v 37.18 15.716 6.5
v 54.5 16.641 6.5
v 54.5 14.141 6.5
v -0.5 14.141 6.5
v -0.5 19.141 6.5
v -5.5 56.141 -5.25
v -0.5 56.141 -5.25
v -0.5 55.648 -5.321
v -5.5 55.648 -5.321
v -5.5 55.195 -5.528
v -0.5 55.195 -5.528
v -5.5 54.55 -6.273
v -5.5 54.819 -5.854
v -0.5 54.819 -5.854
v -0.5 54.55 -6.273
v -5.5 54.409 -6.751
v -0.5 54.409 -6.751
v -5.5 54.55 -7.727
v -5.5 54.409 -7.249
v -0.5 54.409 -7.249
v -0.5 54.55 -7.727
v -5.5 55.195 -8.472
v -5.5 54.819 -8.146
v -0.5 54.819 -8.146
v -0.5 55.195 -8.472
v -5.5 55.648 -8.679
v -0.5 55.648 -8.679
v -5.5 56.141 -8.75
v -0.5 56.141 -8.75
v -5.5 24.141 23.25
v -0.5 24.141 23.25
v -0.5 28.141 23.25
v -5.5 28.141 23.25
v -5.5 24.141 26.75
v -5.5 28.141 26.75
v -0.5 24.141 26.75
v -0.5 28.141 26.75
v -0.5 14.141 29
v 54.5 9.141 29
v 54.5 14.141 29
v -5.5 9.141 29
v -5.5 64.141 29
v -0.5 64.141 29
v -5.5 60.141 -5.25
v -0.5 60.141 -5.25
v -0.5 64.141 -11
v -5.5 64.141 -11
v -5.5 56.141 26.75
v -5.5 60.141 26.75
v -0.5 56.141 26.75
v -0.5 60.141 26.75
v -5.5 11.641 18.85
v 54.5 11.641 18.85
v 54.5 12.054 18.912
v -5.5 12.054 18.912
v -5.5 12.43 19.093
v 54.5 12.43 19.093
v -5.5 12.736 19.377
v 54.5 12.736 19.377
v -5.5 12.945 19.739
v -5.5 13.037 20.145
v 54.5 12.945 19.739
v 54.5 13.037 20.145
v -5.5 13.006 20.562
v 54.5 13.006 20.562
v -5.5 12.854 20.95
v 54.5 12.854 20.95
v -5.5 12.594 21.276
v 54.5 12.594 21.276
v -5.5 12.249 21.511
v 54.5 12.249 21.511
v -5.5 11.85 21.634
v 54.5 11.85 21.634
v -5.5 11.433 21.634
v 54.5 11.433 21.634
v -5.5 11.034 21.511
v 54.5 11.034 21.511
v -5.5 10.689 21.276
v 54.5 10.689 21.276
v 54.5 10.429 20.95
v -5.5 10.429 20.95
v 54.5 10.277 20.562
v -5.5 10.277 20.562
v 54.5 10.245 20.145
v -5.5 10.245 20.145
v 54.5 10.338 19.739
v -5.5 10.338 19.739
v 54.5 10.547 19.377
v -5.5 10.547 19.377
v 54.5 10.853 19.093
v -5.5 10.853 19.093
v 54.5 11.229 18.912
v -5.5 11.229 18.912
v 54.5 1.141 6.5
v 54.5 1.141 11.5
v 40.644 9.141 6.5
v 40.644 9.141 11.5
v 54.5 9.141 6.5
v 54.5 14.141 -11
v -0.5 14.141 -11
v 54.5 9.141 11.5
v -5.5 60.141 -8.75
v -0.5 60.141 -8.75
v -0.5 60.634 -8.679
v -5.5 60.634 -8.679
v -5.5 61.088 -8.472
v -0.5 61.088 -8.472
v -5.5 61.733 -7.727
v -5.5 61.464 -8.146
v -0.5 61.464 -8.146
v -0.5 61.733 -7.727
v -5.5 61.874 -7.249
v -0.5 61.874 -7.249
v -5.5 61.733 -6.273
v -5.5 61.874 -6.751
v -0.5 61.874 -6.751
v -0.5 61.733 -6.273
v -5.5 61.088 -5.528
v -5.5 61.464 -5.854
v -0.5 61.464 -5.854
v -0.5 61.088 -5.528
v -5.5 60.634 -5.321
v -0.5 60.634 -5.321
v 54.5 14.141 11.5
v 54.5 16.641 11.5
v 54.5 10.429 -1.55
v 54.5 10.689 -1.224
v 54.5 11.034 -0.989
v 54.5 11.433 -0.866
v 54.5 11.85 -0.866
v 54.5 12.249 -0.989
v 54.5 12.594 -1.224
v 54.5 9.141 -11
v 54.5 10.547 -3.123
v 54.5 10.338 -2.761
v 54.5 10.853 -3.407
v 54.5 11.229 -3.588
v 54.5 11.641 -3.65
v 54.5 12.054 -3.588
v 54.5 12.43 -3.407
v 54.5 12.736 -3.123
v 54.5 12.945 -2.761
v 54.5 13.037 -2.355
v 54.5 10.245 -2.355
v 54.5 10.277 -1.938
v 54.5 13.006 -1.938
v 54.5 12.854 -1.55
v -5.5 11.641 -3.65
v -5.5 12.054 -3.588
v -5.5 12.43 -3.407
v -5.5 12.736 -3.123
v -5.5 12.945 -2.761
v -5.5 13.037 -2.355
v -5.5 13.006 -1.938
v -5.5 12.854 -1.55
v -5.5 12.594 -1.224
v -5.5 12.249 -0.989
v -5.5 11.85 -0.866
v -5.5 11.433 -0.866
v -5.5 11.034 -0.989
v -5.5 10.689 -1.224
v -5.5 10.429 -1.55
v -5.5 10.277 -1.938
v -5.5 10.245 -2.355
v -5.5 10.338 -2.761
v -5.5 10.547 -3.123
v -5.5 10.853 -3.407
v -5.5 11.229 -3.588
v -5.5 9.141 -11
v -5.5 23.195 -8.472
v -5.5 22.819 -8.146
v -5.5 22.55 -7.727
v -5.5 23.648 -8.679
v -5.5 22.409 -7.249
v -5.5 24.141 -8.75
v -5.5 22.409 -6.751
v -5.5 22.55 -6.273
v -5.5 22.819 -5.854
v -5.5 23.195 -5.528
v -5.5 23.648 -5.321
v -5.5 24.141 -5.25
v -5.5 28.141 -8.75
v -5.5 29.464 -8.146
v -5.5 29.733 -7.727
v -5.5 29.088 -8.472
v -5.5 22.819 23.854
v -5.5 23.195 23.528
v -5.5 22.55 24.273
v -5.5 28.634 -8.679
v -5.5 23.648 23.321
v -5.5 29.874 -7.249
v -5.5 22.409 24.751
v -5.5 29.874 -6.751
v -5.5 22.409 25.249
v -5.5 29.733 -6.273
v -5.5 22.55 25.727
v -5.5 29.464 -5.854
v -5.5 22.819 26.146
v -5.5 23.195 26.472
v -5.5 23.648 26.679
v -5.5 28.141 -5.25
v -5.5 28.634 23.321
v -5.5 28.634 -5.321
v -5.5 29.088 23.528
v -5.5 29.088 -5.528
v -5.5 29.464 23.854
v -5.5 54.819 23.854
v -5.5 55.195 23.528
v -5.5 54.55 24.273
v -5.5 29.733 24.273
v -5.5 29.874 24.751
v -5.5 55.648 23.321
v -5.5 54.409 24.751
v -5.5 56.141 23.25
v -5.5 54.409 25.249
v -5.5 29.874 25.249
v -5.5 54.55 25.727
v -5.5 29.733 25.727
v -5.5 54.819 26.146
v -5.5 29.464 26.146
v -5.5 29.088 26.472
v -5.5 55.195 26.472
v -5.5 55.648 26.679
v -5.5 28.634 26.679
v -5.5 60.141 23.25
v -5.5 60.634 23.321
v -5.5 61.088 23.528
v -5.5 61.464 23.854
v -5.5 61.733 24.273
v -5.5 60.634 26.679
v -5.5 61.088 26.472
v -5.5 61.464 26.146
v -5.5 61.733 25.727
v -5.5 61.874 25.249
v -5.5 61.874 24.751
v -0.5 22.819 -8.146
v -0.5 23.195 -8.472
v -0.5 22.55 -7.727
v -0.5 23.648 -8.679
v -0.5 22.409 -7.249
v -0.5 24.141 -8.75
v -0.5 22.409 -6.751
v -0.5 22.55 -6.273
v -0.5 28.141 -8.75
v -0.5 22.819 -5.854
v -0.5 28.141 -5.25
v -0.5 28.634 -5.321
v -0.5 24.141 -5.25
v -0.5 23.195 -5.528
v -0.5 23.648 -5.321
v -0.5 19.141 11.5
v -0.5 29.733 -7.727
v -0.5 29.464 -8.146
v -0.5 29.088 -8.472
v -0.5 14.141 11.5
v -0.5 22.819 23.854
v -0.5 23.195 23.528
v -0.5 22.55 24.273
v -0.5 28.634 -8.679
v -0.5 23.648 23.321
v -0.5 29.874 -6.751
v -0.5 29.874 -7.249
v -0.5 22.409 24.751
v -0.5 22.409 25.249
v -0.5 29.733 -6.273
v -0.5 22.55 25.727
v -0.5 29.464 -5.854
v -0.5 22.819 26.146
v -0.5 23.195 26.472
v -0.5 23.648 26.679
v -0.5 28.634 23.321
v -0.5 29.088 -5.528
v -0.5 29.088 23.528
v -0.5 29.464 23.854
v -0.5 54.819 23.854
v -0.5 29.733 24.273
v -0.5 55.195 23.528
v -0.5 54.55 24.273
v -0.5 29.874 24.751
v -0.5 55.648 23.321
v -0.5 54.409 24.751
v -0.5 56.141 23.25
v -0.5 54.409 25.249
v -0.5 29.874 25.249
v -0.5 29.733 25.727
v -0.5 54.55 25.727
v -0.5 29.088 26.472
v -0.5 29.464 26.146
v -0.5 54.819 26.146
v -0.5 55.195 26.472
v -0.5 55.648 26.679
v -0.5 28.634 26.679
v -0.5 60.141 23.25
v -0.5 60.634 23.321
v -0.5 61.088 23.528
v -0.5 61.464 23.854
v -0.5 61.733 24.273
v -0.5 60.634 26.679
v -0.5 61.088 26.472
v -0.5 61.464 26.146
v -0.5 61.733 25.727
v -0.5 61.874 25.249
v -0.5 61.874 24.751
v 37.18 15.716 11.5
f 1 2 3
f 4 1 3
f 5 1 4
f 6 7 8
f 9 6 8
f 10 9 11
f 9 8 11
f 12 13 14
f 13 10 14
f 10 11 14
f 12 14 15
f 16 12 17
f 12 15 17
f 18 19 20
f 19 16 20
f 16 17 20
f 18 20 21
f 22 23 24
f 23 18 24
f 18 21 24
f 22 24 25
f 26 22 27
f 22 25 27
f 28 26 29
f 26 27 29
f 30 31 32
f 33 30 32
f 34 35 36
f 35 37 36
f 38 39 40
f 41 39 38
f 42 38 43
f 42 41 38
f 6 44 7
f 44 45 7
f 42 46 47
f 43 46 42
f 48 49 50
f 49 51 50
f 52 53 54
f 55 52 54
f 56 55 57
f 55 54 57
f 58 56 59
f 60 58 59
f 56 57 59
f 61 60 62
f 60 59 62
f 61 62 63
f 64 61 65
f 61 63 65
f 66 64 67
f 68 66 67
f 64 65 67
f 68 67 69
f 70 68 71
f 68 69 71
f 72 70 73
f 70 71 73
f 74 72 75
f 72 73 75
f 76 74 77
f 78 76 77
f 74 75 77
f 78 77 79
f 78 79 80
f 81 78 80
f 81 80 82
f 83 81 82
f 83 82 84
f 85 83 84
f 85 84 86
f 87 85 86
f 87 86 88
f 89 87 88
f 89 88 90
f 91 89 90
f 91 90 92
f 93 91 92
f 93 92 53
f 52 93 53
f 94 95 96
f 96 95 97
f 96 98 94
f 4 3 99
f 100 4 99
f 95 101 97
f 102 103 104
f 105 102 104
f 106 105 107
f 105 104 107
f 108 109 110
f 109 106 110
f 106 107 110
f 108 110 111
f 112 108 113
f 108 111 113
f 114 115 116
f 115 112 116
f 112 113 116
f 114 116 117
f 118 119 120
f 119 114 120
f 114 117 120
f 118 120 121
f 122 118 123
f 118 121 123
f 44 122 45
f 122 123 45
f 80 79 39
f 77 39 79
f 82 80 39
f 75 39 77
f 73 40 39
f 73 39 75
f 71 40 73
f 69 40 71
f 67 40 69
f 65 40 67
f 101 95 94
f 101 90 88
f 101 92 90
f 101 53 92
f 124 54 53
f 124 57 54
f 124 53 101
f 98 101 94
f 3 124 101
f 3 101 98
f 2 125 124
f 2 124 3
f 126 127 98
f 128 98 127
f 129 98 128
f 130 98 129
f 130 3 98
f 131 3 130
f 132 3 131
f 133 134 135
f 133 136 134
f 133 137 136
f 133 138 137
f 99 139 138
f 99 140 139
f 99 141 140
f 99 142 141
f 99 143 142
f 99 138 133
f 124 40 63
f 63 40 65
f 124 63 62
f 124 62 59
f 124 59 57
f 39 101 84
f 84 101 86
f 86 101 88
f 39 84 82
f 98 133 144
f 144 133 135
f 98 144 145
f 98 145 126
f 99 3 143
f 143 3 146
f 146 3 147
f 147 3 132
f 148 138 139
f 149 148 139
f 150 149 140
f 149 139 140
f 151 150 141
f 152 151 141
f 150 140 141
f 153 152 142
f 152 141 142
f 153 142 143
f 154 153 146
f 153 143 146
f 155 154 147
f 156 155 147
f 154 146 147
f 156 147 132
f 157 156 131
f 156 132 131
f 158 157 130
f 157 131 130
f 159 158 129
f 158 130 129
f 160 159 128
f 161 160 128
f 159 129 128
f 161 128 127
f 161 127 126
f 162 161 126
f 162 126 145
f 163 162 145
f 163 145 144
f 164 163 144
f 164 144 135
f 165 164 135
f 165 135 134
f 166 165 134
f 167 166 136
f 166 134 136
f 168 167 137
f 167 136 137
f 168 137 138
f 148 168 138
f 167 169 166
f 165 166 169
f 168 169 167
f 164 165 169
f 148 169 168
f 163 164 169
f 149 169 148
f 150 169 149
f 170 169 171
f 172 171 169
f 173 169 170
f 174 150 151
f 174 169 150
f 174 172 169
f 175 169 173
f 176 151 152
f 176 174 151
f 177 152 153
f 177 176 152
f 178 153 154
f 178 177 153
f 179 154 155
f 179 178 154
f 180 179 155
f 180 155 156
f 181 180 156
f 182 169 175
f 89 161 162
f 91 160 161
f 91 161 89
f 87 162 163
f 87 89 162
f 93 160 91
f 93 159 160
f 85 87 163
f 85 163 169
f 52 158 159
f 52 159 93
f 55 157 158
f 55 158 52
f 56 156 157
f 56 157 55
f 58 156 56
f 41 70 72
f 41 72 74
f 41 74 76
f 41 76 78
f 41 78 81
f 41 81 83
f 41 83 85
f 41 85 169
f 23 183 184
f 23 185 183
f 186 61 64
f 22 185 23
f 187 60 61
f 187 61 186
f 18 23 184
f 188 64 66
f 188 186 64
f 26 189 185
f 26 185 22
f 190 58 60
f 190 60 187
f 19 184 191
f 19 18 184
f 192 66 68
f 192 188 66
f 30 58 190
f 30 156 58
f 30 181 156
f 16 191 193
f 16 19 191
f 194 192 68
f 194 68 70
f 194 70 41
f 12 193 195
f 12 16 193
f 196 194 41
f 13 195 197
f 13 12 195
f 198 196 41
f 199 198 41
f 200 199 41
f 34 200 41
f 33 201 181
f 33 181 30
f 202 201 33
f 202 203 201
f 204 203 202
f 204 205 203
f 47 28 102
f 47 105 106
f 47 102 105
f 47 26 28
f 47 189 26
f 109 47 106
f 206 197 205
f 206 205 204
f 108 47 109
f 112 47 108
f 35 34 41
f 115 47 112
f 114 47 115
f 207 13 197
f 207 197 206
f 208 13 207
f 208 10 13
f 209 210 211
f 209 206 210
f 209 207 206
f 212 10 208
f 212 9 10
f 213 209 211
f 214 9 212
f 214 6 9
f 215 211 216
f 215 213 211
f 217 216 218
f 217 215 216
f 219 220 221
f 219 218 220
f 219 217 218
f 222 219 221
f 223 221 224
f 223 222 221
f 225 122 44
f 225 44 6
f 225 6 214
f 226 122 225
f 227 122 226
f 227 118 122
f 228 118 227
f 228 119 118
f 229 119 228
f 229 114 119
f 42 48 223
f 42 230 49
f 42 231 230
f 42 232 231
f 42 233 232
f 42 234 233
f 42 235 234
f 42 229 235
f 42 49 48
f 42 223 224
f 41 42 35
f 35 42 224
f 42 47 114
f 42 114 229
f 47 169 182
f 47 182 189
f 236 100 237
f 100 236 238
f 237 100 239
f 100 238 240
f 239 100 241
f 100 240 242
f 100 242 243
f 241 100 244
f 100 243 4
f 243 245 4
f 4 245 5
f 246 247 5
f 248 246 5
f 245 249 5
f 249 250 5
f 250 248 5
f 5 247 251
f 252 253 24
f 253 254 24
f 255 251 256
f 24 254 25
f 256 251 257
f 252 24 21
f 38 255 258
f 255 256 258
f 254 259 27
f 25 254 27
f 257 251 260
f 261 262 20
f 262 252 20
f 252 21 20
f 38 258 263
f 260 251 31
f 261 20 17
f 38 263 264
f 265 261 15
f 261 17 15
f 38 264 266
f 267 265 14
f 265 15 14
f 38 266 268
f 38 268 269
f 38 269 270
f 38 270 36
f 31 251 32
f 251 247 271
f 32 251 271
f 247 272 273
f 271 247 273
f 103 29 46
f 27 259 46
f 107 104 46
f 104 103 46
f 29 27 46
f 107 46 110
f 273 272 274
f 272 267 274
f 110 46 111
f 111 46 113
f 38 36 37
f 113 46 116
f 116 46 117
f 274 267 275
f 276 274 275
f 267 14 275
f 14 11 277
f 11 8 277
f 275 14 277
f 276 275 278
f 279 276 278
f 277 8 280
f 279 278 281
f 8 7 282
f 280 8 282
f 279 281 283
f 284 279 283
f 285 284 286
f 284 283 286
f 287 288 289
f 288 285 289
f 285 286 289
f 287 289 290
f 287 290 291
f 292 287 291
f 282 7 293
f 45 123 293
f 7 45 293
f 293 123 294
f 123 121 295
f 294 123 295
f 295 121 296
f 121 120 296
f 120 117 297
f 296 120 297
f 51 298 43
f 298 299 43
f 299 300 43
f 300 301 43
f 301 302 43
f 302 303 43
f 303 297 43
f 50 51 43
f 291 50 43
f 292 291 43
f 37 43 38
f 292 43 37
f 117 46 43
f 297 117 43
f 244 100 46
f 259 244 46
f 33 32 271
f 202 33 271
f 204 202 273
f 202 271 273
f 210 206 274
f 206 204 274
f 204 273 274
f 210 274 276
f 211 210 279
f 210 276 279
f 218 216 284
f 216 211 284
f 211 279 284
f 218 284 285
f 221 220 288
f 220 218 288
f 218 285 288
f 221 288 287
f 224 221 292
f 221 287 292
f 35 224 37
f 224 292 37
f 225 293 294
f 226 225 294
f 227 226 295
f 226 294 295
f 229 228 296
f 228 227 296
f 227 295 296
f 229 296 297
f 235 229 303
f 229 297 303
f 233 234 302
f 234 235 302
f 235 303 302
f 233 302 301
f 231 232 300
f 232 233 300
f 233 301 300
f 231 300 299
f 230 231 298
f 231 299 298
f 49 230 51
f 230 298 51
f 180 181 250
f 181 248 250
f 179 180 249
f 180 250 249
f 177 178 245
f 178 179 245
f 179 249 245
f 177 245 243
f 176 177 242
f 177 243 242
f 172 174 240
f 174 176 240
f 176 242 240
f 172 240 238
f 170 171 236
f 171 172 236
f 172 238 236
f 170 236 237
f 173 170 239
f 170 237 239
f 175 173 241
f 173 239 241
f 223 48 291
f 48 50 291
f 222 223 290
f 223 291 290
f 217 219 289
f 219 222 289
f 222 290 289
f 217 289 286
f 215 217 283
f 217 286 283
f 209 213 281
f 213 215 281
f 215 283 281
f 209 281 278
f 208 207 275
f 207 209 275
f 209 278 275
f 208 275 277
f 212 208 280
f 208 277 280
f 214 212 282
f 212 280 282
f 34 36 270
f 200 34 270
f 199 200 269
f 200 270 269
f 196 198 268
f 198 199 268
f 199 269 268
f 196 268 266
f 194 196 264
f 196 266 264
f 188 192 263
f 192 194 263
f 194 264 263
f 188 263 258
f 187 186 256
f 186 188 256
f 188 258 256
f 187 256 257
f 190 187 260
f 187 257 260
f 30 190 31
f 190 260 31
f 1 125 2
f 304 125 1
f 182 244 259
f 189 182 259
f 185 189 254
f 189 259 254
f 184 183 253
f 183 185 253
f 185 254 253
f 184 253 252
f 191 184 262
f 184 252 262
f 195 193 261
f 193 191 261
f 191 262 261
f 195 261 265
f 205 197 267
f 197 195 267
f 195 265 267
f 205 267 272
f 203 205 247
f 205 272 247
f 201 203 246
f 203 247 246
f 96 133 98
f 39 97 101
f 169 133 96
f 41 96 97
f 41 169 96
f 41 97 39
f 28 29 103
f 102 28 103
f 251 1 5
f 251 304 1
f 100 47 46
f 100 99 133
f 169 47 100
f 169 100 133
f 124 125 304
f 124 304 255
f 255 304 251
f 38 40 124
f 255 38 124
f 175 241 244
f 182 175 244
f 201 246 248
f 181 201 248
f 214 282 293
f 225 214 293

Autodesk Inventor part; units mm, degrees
ref_plane "YZ Plane" through (0, 0, 0) normal (1, 0, 0) x (0, 1, 0)
ref_plane "XZ Plane" through (0, 0, 0) normal (0, 1, 0) x (-1, 0, 0)
ref_plane "XY Plane" through (0, 0, 0) normal (0, 0, 1) x (1, 0, 0)
ref_plane "Arbeitsebene1" through (-0.5, 64.1414, -11) normal (-1, 0, 0) x (0, 0, 1)
sketch "Skizze1" plane through (-0.5, 64.1414, -11) normal (-1, 0, 0) x (0, 0, 1)
  line L0 (40, -27) -> (40, -40) projected
  line L1 (40, -27) -> (29, -27) projected
  line L2 (29, -40) -> (29, -27) projected
  line L3 (29, -40) -> (40, -40) projected
  circle A0 centre (32, -32) radius 1.5 projected
  circle A1 centre (36, -36) radius 1.75 projected
  line L4 (0, -40) -> (11, -40) projected
  line L5 (11, -40) -> (11, -27) projected
  line L6 (0, -27) -> (11, -27) projected
  line L7 (0, -27) -> (0, -40) projected
  circle A2 centre (8, -32) radius 1.5 projected
  circle A3 centre (4, -36) radius 1.75 projected
  line L8 (0, 0) -> (0, -13) projected
  line L9 (0, -13) -> (11, -13) projected
  line L10 (11, 0) -> (11, -13) projected
  line L11 (0, 0) -> (11, 0) projected
  circle A4 centre (8, -8) radius 1.5 projected
  circle A5 centre (4, -4) radius 1.75 projected
  line L12 (29, 0) -> (40, 0) projected
  line L13 (29, 0) -> (29, -13) projected
  line L14 (40, -13) -> (29, -13) projected
  line L15 (40, 0) -> (40, -13) projected
  circle A6 centre (32, -8) radius 1.5 projected
  circle A7 centre (36, -4) radius 1.75 projected
  line L16 (40, -40) -> (0, -40)
  line L17 (0, -40) -> (0, 0)
  line L18 (0, 0) -> (40, 0)
  line L19 (40, 0) -> (40, -40)
  line L20 (40, -40) -> (0, -40)
  line L21 (0, -40) -> (0, -55)
  line L22 (0, -55) -> (40, -55)
  line L23 (40, -55) -> (40, -40)
  line L24 (36, -36) -> (36, -40) construction
  line L25 (37.75, -36) -> (37.75, -40)
  line L26 (34.25, -40) -> (34.25, -36)
  arc A8 (37.75, -36) -> (34.25, -36) centre (36, -36) ccw
  arc A9 (34.25, -40) -> (37.75, -40) centre (36, -40) ccw
  line L27 (4, -36) -> (4, -40) construction
  line L28 (5.75, -36) -> (5.75, -40)
  line L29 (2.25, -40) -> (2.25, -36)
  arc A10 (5.75, -36) -> (2.25, -36) centre (4, -36) ccw
  arc A11 (2.25, -40) -> (5.75, -40) centre (4, -40) ccw
  line L30 (4, -4) -> (4, -8) construction
  line L31 (5.75, -4) -> (5.75, -8)
  line L32 (2.25, -8) -> (2.25, -4)
  arc A12 (5.75, -4) -> (2.25, -4) centre (4, -4) ccw
  arc A13 (2.25, -8) -> (5.75, -8) centre (4, -8) ccw
  line L33 (36, -4) -> (36, -8) construction
  line L34 (37.75, -4) -> (37.75, -8)
  line L35 (34.25, -8) -> (34.25, -4)
  arc A14 (37.75, -4) -> (34.25, -4) centre (36, -4) ccw
  arc A15 (34.25, -8) -> (37.75, -8) centre (36, -8) ccw
  point P0 (11, -64.1414)
  point P1 (40, -13)
  point P2 (0, -13)
  point P3 (0, -27)
  point P4 (0, -40)
  point P5 (36, -38)
  point P6 (4, -38)
  point P7 (4, -6)
  point P8 (36, -6)
  point P9 (37.75, -4)
  point P10 (34.25, -4)
  point P11 (5.75, -4)
  point P12 (2.25, -4)
  dimension "d0" = 15
extrude "Extrusion1" add sketch "Skizze1" along normal blind 5 contours L0 L3 L25 A1 L26 L2 L1 | L1 L2 L16 L5 L6 L17 L9 L10 L18 L13 L14 L19 | L23 L22 L21 L4 A11 L16 L3 A9 | L14 L13 L12 L15 | L4 L28 A3 L29 L7 L6 L5 | L10 L9 L8 L11 | A0 | A2 | A4 | A6
sketch "Skizze2" plane through (-0.5, 64.1414, -11) normal (1, 0, 0) x (0, 0, -1)
  line L0 (-40, -55) -> (-40, 0) projected
  line L1 (0, -55) -> (-40, -55) projected
  line L2 (0, 0) -> (0, -55) projected
  line L3 (-40, 0) -> (0, 0) projected
  arc A0 (-2.25, -36) -> (-5.75, -36) centre (-4, -36) ccw projected
  arc A1 (-2.25, -4) -> (-5.75, -4) centre (-4, -4) ccw projected
  arc A2 (-34.25, -4) -> (-37.75, -4) centre (-36, -4) ccw projected
  arc A3 (-34.25, -36) -> (-37.75, -36) centre (-36, -36) ccw projected
  line L4 (0, -55) -> (-40, -55)
  line L5 (-40, -55) -> (-40, -50)
  line L6 (-40, -50) -> (0, -50)
  line L7 (0, -50) -> (0, -55)
  line L8 (-2.25, -40) -> (-2.25, -36) projected
  arc A4 (-5.75, -40) -> (-2.25, -40) centre (-4, -40) ccw projected
  line L9 (-5.75, -36) -> (-5.75, -40) projected
  line L10 (-37.75, -4) -> (-37.75, -8) projected
  line L11 (-34.25, -8) -> (-34.25, -4) projected
  arc A5 (-37.75, -8) -> (-34.25, -8) centre (-36, -8) ccw projected
  line L12 (-34.25, -40) -> (-34.25, -36) projected
  arc A6 (-37.75, -40) -> (-34.25, -40) centre (-36, -40) ccw projected
  line L13 (-37.75, -36) -> (-37.75, -40) projected
  line L14 (-5.75, -4) -> (-5.75, -8) projected
  line L15 (-2.25, -8) -> (-2.25, -4) projected
  arc A7 (-5.75, -8) -> (-2.25, -8) centre (-4, -8) ccw projected
  point P0 (-11, -64.1414)
  dimension "d3" = 5
extrude "Extrusion2" add sketch "Skizze2" along normal blind 55 contours L0 L6 L2 L1
ref_plane "Arbeitsebene2" through (-0.5, 64.1414, 9) normal (0, 0, -1) x (-1, 0, 0)
sketch "Skizze3" plane through (-0.5, 64.1414, 9) normal (0, 0, -1) x (-1, 0, 0)
  line L0 (0, 0) -> (0, -50) projected
  line L1 (0, -50) -> (-55, -50) projected
  line L2 (-55, -55) -> (-55, -50) projected
  line L3 (5, -55) -> (-55, -55) projected
  line L4 (5, 0) -> (5, -55) projected
  line L5 (0, 0) -> (5, 0) projected
  line L6 (0, -50) -> (-55, -50) projected
  line L7 (-55, -50) -> (0, -45)
  line L8 (-55, -55) -> (-55, -50) projected
  line L9 (-55, -55) -> (-55, -63)
  line L10 (-55, -63) -> (-41.1436, -55)
  line L11 (-55, -55) -> (5, -55) projected
  line L12 (-41.1436, -55) -> (-55, -55)
  line L13 (-55, -50) -> (-55, -47.5)
  line L14 (-55, -47.5) -> (-37.6795, -48.4254)
  point P0 (-0.5, -64.1414)
  point P1 (-41.1436, -55)
  dimension "d7" = 5
  dimension "d14" = 8
  dimension "d15" = 60
extrude "Extrusion3" add sketch "Skizze3" along normal mid plane 5 contours L0 L1 L7 | L7 L13 L14 | L10 L9 L3
sketch "Skizze4" plane through (54.5, 64.1414, -11) normal (1, 0, 0) x (0, 0, -1)
  line L0 (-40, -50) -> (-40, -55) projected
  line L1 (-40, -55) -> (-22.5, -55) projected
  line L2 (0, -55) -> (0, -50) projected
  line L3 (-22.5, -50) -> (-40, -50) projected
  line L4 (0, -50) -> (-17.5, -50) projected
  circle A0 centre (-8.75, -52.5) radius 1.4
  circle A1 centre (-31.25, -52.5) radius 1.4
  line L5 (-22.5, -63) -> (-22.5, -55) projected
  line L6 (-17.5, -63) -> (-22.5, -63) projected
  line L7 (-17.5, -55) -> (-17.5, -63) projected
  line L8 (-17.5, -55) -> (0, -55) projected
  line L9 (-17.5, -47.5) -> (-17.5, -50) projected
  line L10 (-22.5, -47.5) -> (-17.5, -47.5) projected
  line L11 (-22.5, -50) -> (-22.5, -47.5) projected
  point P0 (-11, -64.1414)
  dimension "d10" = 2.8
  dimension "d11" = 2.8
extrude "Extrusion4" cut sketch "Skizze4" against normal through all contours A0 | A1
properties part number "40_XYZstage_micrometer_motorized_nema8_lightsheet_samplemount_ontop"
